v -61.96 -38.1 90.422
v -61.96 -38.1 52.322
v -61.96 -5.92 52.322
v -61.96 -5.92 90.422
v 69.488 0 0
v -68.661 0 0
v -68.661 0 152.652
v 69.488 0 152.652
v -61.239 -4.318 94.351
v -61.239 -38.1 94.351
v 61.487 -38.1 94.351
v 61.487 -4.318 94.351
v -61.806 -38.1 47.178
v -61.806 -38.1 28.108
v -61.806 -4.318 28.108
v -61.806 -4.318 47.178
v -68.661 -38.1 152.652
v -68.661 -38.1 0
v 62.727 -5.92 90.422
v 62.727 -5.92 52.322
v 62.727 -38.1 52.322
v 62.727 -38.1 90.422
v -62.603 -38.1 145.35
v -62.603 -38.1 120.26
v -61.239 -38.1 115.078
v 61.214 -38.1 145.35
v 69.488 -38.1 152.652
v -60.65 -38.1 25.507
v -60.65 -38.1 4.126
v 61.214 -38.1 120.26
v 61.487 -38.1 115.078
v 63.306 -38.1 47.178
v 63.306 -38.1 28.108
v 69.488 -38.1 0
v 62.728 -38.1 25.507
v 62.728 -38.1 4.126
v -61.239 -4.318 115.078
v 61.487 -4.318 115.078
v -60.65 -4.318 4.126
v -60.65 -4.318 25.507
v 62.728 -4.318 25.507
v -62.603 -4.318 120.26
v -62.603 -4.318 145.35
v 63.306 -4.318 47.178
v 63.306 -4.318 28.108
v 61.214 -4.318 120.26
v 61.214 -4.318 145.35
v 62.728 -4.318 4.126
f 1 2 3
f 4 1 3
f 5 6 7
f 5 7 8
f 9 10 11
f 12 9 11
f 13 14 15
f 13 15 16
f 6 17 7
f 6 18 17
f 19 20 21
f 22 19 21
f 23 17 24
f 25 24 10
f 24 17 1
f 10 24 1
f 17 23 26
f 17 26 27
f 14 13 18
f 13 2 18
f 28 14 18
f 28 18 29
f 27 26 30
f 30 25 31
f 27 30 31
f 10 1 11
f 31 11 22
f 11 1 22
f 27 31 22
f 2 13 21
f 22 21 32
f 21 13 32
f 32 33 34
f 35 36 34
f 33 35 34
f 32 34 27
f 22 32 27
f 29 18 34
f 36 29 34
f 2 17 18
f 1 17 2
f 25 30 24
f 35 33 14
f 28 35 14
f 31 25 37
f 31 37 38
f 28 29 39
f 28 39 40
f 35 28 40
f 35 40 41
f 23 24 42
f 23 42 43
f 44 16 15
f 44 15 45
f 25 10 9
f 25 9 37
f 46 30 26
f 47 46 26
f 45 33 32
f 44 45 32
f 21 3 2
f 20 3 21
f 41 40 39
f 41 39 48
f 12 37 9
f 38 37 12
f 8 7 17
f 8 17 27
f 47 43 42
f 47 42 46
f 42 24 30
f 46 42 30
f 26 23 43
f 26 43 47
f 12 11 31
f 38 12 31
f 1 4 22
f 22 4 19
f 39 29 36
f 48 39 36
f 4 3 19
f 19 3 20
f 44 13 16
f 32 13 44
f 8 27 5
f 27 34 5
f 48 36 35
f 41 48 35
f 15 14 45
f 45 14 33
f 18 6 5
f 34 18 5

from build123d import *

# Parameters (mm, degrees)
F0_W      = 138.1484791636
F0_H      = 52.3216351867
F1_DEPTH  = 38.1
F2_W      = 124.6868036687
F2_H      = 5.9200678952
F3_DEPTH  = 38.1
F4_W      = 138.1484791636
F4_H      = 38.1
F5_DEPTH  = 2.54
F6_W      = 138.1484791636
F6_H      = 38.1
F7_DEPTH  = 59.69
F8_W      = 122.7258816361
F8_H      = 20.7270383835
F12_DEPTH = 33.782
F9_W      = 123.8167844713
F9_H      = 25.0906273723
F13_DEPTH = 33.782
F10_W     = 125.1115500927
F10_H     = 19.0701205283
F14_DEPTH = 33.782
F11_W     = 123.3779042959
F11_H     = 21.381651517
F15_DEPTH = 33.782


# Not quite as in the source:
# - a feature names something its author has since deleted; it is built from what else it names


with BuildPart() as f1:
    # F0 (on Front) → F1 (new body)
    with BuildSketch(Plane.XZ):
        with Locations((0.4136152565, 26.1608175933)):
            Rectangle(F0_W, F0_H)
    extrude(amount=F1_DEPTH)

    # F2 (on face) → F3 (join)
    with BuildSketch(Plane.XY.offset(52.3216351867)):
        Polygon((-61.9600676, 0), (-68.6606243253, 0), (-68.6606243253, -38.1), (-61.9600676, -38.1), (-61.9600676, -5.9200678952), align=None)
        with Locations((0.3833342344, -2.9600339476)):
            Rectangle(F2_W, F2_H)
        Polygon((69.4878548384, 0), (62.7267360687, 0), (62.7267360687, -5.9200678952), (62.7267360687, -38.1), (69.4878548384, -38.1), align=None)
    extrude(amount=F3_DEPTH)

    # F4 (on face) → F5 (join)
    with BuildSketch(Plane.XY.offset(90.4216351867)):
        with Locations((0.4136152565, -19.05)):
            Rectangle(F4_W, F4_H)
    extrude(amount=F5_DEPTH)

    # F6 (on face) → F7 (join)
    with BuildSketch(Plane.XY.offset(92.9616351867)):
        with Locations((0.4136152565, -19.05)):
            Rectangle(F6_W, F6_H)
    extrude(amount=F7_DEPTH)

    # F8 (on face) → F12 (cut)
    with BuildSketch(Plane.XZ.offset(38.1)):
        with Locations((0.1238100231, 104.7143563628)):
            Rectangle(F8_W, F8_H)
    extrude(amount=-F12_DEPTH, mode=Mode.SUBTRACT)

    # F9 (on face) → F13 (cut)
    with BuildSketch(Plane.XZ.offset(38.1)):
        with Locations((-0.694366172, 132.8049488366)):
            Rectangle(F9_W, F9_H)
    extrude(amount=-F13_DEPTH, mode=Mode.SUBTRACT)

    # F10 (on face) → F14 (cut)
    with BuildSketch(Plane.XZ.offset(38.1)):
        with Locations((0.7500052452, 37.6429138705)):
            Rectangle(F10_W, F10_H)
    extrude(amount=-F14_DEPTH, mode=Mode.SUBTRACT)

    # F11 (on face) → F15 (cut)
    with BuildSketch(Plane.XZ.offset(38.1)):
        with Locations((1.0389462113, 14.81655729)):
            Rectangle(F11_W, F11_H)
    extrude(amount=-F15_DEPTH, mode=Mode.SUBTRACT)


solid = f1.part
